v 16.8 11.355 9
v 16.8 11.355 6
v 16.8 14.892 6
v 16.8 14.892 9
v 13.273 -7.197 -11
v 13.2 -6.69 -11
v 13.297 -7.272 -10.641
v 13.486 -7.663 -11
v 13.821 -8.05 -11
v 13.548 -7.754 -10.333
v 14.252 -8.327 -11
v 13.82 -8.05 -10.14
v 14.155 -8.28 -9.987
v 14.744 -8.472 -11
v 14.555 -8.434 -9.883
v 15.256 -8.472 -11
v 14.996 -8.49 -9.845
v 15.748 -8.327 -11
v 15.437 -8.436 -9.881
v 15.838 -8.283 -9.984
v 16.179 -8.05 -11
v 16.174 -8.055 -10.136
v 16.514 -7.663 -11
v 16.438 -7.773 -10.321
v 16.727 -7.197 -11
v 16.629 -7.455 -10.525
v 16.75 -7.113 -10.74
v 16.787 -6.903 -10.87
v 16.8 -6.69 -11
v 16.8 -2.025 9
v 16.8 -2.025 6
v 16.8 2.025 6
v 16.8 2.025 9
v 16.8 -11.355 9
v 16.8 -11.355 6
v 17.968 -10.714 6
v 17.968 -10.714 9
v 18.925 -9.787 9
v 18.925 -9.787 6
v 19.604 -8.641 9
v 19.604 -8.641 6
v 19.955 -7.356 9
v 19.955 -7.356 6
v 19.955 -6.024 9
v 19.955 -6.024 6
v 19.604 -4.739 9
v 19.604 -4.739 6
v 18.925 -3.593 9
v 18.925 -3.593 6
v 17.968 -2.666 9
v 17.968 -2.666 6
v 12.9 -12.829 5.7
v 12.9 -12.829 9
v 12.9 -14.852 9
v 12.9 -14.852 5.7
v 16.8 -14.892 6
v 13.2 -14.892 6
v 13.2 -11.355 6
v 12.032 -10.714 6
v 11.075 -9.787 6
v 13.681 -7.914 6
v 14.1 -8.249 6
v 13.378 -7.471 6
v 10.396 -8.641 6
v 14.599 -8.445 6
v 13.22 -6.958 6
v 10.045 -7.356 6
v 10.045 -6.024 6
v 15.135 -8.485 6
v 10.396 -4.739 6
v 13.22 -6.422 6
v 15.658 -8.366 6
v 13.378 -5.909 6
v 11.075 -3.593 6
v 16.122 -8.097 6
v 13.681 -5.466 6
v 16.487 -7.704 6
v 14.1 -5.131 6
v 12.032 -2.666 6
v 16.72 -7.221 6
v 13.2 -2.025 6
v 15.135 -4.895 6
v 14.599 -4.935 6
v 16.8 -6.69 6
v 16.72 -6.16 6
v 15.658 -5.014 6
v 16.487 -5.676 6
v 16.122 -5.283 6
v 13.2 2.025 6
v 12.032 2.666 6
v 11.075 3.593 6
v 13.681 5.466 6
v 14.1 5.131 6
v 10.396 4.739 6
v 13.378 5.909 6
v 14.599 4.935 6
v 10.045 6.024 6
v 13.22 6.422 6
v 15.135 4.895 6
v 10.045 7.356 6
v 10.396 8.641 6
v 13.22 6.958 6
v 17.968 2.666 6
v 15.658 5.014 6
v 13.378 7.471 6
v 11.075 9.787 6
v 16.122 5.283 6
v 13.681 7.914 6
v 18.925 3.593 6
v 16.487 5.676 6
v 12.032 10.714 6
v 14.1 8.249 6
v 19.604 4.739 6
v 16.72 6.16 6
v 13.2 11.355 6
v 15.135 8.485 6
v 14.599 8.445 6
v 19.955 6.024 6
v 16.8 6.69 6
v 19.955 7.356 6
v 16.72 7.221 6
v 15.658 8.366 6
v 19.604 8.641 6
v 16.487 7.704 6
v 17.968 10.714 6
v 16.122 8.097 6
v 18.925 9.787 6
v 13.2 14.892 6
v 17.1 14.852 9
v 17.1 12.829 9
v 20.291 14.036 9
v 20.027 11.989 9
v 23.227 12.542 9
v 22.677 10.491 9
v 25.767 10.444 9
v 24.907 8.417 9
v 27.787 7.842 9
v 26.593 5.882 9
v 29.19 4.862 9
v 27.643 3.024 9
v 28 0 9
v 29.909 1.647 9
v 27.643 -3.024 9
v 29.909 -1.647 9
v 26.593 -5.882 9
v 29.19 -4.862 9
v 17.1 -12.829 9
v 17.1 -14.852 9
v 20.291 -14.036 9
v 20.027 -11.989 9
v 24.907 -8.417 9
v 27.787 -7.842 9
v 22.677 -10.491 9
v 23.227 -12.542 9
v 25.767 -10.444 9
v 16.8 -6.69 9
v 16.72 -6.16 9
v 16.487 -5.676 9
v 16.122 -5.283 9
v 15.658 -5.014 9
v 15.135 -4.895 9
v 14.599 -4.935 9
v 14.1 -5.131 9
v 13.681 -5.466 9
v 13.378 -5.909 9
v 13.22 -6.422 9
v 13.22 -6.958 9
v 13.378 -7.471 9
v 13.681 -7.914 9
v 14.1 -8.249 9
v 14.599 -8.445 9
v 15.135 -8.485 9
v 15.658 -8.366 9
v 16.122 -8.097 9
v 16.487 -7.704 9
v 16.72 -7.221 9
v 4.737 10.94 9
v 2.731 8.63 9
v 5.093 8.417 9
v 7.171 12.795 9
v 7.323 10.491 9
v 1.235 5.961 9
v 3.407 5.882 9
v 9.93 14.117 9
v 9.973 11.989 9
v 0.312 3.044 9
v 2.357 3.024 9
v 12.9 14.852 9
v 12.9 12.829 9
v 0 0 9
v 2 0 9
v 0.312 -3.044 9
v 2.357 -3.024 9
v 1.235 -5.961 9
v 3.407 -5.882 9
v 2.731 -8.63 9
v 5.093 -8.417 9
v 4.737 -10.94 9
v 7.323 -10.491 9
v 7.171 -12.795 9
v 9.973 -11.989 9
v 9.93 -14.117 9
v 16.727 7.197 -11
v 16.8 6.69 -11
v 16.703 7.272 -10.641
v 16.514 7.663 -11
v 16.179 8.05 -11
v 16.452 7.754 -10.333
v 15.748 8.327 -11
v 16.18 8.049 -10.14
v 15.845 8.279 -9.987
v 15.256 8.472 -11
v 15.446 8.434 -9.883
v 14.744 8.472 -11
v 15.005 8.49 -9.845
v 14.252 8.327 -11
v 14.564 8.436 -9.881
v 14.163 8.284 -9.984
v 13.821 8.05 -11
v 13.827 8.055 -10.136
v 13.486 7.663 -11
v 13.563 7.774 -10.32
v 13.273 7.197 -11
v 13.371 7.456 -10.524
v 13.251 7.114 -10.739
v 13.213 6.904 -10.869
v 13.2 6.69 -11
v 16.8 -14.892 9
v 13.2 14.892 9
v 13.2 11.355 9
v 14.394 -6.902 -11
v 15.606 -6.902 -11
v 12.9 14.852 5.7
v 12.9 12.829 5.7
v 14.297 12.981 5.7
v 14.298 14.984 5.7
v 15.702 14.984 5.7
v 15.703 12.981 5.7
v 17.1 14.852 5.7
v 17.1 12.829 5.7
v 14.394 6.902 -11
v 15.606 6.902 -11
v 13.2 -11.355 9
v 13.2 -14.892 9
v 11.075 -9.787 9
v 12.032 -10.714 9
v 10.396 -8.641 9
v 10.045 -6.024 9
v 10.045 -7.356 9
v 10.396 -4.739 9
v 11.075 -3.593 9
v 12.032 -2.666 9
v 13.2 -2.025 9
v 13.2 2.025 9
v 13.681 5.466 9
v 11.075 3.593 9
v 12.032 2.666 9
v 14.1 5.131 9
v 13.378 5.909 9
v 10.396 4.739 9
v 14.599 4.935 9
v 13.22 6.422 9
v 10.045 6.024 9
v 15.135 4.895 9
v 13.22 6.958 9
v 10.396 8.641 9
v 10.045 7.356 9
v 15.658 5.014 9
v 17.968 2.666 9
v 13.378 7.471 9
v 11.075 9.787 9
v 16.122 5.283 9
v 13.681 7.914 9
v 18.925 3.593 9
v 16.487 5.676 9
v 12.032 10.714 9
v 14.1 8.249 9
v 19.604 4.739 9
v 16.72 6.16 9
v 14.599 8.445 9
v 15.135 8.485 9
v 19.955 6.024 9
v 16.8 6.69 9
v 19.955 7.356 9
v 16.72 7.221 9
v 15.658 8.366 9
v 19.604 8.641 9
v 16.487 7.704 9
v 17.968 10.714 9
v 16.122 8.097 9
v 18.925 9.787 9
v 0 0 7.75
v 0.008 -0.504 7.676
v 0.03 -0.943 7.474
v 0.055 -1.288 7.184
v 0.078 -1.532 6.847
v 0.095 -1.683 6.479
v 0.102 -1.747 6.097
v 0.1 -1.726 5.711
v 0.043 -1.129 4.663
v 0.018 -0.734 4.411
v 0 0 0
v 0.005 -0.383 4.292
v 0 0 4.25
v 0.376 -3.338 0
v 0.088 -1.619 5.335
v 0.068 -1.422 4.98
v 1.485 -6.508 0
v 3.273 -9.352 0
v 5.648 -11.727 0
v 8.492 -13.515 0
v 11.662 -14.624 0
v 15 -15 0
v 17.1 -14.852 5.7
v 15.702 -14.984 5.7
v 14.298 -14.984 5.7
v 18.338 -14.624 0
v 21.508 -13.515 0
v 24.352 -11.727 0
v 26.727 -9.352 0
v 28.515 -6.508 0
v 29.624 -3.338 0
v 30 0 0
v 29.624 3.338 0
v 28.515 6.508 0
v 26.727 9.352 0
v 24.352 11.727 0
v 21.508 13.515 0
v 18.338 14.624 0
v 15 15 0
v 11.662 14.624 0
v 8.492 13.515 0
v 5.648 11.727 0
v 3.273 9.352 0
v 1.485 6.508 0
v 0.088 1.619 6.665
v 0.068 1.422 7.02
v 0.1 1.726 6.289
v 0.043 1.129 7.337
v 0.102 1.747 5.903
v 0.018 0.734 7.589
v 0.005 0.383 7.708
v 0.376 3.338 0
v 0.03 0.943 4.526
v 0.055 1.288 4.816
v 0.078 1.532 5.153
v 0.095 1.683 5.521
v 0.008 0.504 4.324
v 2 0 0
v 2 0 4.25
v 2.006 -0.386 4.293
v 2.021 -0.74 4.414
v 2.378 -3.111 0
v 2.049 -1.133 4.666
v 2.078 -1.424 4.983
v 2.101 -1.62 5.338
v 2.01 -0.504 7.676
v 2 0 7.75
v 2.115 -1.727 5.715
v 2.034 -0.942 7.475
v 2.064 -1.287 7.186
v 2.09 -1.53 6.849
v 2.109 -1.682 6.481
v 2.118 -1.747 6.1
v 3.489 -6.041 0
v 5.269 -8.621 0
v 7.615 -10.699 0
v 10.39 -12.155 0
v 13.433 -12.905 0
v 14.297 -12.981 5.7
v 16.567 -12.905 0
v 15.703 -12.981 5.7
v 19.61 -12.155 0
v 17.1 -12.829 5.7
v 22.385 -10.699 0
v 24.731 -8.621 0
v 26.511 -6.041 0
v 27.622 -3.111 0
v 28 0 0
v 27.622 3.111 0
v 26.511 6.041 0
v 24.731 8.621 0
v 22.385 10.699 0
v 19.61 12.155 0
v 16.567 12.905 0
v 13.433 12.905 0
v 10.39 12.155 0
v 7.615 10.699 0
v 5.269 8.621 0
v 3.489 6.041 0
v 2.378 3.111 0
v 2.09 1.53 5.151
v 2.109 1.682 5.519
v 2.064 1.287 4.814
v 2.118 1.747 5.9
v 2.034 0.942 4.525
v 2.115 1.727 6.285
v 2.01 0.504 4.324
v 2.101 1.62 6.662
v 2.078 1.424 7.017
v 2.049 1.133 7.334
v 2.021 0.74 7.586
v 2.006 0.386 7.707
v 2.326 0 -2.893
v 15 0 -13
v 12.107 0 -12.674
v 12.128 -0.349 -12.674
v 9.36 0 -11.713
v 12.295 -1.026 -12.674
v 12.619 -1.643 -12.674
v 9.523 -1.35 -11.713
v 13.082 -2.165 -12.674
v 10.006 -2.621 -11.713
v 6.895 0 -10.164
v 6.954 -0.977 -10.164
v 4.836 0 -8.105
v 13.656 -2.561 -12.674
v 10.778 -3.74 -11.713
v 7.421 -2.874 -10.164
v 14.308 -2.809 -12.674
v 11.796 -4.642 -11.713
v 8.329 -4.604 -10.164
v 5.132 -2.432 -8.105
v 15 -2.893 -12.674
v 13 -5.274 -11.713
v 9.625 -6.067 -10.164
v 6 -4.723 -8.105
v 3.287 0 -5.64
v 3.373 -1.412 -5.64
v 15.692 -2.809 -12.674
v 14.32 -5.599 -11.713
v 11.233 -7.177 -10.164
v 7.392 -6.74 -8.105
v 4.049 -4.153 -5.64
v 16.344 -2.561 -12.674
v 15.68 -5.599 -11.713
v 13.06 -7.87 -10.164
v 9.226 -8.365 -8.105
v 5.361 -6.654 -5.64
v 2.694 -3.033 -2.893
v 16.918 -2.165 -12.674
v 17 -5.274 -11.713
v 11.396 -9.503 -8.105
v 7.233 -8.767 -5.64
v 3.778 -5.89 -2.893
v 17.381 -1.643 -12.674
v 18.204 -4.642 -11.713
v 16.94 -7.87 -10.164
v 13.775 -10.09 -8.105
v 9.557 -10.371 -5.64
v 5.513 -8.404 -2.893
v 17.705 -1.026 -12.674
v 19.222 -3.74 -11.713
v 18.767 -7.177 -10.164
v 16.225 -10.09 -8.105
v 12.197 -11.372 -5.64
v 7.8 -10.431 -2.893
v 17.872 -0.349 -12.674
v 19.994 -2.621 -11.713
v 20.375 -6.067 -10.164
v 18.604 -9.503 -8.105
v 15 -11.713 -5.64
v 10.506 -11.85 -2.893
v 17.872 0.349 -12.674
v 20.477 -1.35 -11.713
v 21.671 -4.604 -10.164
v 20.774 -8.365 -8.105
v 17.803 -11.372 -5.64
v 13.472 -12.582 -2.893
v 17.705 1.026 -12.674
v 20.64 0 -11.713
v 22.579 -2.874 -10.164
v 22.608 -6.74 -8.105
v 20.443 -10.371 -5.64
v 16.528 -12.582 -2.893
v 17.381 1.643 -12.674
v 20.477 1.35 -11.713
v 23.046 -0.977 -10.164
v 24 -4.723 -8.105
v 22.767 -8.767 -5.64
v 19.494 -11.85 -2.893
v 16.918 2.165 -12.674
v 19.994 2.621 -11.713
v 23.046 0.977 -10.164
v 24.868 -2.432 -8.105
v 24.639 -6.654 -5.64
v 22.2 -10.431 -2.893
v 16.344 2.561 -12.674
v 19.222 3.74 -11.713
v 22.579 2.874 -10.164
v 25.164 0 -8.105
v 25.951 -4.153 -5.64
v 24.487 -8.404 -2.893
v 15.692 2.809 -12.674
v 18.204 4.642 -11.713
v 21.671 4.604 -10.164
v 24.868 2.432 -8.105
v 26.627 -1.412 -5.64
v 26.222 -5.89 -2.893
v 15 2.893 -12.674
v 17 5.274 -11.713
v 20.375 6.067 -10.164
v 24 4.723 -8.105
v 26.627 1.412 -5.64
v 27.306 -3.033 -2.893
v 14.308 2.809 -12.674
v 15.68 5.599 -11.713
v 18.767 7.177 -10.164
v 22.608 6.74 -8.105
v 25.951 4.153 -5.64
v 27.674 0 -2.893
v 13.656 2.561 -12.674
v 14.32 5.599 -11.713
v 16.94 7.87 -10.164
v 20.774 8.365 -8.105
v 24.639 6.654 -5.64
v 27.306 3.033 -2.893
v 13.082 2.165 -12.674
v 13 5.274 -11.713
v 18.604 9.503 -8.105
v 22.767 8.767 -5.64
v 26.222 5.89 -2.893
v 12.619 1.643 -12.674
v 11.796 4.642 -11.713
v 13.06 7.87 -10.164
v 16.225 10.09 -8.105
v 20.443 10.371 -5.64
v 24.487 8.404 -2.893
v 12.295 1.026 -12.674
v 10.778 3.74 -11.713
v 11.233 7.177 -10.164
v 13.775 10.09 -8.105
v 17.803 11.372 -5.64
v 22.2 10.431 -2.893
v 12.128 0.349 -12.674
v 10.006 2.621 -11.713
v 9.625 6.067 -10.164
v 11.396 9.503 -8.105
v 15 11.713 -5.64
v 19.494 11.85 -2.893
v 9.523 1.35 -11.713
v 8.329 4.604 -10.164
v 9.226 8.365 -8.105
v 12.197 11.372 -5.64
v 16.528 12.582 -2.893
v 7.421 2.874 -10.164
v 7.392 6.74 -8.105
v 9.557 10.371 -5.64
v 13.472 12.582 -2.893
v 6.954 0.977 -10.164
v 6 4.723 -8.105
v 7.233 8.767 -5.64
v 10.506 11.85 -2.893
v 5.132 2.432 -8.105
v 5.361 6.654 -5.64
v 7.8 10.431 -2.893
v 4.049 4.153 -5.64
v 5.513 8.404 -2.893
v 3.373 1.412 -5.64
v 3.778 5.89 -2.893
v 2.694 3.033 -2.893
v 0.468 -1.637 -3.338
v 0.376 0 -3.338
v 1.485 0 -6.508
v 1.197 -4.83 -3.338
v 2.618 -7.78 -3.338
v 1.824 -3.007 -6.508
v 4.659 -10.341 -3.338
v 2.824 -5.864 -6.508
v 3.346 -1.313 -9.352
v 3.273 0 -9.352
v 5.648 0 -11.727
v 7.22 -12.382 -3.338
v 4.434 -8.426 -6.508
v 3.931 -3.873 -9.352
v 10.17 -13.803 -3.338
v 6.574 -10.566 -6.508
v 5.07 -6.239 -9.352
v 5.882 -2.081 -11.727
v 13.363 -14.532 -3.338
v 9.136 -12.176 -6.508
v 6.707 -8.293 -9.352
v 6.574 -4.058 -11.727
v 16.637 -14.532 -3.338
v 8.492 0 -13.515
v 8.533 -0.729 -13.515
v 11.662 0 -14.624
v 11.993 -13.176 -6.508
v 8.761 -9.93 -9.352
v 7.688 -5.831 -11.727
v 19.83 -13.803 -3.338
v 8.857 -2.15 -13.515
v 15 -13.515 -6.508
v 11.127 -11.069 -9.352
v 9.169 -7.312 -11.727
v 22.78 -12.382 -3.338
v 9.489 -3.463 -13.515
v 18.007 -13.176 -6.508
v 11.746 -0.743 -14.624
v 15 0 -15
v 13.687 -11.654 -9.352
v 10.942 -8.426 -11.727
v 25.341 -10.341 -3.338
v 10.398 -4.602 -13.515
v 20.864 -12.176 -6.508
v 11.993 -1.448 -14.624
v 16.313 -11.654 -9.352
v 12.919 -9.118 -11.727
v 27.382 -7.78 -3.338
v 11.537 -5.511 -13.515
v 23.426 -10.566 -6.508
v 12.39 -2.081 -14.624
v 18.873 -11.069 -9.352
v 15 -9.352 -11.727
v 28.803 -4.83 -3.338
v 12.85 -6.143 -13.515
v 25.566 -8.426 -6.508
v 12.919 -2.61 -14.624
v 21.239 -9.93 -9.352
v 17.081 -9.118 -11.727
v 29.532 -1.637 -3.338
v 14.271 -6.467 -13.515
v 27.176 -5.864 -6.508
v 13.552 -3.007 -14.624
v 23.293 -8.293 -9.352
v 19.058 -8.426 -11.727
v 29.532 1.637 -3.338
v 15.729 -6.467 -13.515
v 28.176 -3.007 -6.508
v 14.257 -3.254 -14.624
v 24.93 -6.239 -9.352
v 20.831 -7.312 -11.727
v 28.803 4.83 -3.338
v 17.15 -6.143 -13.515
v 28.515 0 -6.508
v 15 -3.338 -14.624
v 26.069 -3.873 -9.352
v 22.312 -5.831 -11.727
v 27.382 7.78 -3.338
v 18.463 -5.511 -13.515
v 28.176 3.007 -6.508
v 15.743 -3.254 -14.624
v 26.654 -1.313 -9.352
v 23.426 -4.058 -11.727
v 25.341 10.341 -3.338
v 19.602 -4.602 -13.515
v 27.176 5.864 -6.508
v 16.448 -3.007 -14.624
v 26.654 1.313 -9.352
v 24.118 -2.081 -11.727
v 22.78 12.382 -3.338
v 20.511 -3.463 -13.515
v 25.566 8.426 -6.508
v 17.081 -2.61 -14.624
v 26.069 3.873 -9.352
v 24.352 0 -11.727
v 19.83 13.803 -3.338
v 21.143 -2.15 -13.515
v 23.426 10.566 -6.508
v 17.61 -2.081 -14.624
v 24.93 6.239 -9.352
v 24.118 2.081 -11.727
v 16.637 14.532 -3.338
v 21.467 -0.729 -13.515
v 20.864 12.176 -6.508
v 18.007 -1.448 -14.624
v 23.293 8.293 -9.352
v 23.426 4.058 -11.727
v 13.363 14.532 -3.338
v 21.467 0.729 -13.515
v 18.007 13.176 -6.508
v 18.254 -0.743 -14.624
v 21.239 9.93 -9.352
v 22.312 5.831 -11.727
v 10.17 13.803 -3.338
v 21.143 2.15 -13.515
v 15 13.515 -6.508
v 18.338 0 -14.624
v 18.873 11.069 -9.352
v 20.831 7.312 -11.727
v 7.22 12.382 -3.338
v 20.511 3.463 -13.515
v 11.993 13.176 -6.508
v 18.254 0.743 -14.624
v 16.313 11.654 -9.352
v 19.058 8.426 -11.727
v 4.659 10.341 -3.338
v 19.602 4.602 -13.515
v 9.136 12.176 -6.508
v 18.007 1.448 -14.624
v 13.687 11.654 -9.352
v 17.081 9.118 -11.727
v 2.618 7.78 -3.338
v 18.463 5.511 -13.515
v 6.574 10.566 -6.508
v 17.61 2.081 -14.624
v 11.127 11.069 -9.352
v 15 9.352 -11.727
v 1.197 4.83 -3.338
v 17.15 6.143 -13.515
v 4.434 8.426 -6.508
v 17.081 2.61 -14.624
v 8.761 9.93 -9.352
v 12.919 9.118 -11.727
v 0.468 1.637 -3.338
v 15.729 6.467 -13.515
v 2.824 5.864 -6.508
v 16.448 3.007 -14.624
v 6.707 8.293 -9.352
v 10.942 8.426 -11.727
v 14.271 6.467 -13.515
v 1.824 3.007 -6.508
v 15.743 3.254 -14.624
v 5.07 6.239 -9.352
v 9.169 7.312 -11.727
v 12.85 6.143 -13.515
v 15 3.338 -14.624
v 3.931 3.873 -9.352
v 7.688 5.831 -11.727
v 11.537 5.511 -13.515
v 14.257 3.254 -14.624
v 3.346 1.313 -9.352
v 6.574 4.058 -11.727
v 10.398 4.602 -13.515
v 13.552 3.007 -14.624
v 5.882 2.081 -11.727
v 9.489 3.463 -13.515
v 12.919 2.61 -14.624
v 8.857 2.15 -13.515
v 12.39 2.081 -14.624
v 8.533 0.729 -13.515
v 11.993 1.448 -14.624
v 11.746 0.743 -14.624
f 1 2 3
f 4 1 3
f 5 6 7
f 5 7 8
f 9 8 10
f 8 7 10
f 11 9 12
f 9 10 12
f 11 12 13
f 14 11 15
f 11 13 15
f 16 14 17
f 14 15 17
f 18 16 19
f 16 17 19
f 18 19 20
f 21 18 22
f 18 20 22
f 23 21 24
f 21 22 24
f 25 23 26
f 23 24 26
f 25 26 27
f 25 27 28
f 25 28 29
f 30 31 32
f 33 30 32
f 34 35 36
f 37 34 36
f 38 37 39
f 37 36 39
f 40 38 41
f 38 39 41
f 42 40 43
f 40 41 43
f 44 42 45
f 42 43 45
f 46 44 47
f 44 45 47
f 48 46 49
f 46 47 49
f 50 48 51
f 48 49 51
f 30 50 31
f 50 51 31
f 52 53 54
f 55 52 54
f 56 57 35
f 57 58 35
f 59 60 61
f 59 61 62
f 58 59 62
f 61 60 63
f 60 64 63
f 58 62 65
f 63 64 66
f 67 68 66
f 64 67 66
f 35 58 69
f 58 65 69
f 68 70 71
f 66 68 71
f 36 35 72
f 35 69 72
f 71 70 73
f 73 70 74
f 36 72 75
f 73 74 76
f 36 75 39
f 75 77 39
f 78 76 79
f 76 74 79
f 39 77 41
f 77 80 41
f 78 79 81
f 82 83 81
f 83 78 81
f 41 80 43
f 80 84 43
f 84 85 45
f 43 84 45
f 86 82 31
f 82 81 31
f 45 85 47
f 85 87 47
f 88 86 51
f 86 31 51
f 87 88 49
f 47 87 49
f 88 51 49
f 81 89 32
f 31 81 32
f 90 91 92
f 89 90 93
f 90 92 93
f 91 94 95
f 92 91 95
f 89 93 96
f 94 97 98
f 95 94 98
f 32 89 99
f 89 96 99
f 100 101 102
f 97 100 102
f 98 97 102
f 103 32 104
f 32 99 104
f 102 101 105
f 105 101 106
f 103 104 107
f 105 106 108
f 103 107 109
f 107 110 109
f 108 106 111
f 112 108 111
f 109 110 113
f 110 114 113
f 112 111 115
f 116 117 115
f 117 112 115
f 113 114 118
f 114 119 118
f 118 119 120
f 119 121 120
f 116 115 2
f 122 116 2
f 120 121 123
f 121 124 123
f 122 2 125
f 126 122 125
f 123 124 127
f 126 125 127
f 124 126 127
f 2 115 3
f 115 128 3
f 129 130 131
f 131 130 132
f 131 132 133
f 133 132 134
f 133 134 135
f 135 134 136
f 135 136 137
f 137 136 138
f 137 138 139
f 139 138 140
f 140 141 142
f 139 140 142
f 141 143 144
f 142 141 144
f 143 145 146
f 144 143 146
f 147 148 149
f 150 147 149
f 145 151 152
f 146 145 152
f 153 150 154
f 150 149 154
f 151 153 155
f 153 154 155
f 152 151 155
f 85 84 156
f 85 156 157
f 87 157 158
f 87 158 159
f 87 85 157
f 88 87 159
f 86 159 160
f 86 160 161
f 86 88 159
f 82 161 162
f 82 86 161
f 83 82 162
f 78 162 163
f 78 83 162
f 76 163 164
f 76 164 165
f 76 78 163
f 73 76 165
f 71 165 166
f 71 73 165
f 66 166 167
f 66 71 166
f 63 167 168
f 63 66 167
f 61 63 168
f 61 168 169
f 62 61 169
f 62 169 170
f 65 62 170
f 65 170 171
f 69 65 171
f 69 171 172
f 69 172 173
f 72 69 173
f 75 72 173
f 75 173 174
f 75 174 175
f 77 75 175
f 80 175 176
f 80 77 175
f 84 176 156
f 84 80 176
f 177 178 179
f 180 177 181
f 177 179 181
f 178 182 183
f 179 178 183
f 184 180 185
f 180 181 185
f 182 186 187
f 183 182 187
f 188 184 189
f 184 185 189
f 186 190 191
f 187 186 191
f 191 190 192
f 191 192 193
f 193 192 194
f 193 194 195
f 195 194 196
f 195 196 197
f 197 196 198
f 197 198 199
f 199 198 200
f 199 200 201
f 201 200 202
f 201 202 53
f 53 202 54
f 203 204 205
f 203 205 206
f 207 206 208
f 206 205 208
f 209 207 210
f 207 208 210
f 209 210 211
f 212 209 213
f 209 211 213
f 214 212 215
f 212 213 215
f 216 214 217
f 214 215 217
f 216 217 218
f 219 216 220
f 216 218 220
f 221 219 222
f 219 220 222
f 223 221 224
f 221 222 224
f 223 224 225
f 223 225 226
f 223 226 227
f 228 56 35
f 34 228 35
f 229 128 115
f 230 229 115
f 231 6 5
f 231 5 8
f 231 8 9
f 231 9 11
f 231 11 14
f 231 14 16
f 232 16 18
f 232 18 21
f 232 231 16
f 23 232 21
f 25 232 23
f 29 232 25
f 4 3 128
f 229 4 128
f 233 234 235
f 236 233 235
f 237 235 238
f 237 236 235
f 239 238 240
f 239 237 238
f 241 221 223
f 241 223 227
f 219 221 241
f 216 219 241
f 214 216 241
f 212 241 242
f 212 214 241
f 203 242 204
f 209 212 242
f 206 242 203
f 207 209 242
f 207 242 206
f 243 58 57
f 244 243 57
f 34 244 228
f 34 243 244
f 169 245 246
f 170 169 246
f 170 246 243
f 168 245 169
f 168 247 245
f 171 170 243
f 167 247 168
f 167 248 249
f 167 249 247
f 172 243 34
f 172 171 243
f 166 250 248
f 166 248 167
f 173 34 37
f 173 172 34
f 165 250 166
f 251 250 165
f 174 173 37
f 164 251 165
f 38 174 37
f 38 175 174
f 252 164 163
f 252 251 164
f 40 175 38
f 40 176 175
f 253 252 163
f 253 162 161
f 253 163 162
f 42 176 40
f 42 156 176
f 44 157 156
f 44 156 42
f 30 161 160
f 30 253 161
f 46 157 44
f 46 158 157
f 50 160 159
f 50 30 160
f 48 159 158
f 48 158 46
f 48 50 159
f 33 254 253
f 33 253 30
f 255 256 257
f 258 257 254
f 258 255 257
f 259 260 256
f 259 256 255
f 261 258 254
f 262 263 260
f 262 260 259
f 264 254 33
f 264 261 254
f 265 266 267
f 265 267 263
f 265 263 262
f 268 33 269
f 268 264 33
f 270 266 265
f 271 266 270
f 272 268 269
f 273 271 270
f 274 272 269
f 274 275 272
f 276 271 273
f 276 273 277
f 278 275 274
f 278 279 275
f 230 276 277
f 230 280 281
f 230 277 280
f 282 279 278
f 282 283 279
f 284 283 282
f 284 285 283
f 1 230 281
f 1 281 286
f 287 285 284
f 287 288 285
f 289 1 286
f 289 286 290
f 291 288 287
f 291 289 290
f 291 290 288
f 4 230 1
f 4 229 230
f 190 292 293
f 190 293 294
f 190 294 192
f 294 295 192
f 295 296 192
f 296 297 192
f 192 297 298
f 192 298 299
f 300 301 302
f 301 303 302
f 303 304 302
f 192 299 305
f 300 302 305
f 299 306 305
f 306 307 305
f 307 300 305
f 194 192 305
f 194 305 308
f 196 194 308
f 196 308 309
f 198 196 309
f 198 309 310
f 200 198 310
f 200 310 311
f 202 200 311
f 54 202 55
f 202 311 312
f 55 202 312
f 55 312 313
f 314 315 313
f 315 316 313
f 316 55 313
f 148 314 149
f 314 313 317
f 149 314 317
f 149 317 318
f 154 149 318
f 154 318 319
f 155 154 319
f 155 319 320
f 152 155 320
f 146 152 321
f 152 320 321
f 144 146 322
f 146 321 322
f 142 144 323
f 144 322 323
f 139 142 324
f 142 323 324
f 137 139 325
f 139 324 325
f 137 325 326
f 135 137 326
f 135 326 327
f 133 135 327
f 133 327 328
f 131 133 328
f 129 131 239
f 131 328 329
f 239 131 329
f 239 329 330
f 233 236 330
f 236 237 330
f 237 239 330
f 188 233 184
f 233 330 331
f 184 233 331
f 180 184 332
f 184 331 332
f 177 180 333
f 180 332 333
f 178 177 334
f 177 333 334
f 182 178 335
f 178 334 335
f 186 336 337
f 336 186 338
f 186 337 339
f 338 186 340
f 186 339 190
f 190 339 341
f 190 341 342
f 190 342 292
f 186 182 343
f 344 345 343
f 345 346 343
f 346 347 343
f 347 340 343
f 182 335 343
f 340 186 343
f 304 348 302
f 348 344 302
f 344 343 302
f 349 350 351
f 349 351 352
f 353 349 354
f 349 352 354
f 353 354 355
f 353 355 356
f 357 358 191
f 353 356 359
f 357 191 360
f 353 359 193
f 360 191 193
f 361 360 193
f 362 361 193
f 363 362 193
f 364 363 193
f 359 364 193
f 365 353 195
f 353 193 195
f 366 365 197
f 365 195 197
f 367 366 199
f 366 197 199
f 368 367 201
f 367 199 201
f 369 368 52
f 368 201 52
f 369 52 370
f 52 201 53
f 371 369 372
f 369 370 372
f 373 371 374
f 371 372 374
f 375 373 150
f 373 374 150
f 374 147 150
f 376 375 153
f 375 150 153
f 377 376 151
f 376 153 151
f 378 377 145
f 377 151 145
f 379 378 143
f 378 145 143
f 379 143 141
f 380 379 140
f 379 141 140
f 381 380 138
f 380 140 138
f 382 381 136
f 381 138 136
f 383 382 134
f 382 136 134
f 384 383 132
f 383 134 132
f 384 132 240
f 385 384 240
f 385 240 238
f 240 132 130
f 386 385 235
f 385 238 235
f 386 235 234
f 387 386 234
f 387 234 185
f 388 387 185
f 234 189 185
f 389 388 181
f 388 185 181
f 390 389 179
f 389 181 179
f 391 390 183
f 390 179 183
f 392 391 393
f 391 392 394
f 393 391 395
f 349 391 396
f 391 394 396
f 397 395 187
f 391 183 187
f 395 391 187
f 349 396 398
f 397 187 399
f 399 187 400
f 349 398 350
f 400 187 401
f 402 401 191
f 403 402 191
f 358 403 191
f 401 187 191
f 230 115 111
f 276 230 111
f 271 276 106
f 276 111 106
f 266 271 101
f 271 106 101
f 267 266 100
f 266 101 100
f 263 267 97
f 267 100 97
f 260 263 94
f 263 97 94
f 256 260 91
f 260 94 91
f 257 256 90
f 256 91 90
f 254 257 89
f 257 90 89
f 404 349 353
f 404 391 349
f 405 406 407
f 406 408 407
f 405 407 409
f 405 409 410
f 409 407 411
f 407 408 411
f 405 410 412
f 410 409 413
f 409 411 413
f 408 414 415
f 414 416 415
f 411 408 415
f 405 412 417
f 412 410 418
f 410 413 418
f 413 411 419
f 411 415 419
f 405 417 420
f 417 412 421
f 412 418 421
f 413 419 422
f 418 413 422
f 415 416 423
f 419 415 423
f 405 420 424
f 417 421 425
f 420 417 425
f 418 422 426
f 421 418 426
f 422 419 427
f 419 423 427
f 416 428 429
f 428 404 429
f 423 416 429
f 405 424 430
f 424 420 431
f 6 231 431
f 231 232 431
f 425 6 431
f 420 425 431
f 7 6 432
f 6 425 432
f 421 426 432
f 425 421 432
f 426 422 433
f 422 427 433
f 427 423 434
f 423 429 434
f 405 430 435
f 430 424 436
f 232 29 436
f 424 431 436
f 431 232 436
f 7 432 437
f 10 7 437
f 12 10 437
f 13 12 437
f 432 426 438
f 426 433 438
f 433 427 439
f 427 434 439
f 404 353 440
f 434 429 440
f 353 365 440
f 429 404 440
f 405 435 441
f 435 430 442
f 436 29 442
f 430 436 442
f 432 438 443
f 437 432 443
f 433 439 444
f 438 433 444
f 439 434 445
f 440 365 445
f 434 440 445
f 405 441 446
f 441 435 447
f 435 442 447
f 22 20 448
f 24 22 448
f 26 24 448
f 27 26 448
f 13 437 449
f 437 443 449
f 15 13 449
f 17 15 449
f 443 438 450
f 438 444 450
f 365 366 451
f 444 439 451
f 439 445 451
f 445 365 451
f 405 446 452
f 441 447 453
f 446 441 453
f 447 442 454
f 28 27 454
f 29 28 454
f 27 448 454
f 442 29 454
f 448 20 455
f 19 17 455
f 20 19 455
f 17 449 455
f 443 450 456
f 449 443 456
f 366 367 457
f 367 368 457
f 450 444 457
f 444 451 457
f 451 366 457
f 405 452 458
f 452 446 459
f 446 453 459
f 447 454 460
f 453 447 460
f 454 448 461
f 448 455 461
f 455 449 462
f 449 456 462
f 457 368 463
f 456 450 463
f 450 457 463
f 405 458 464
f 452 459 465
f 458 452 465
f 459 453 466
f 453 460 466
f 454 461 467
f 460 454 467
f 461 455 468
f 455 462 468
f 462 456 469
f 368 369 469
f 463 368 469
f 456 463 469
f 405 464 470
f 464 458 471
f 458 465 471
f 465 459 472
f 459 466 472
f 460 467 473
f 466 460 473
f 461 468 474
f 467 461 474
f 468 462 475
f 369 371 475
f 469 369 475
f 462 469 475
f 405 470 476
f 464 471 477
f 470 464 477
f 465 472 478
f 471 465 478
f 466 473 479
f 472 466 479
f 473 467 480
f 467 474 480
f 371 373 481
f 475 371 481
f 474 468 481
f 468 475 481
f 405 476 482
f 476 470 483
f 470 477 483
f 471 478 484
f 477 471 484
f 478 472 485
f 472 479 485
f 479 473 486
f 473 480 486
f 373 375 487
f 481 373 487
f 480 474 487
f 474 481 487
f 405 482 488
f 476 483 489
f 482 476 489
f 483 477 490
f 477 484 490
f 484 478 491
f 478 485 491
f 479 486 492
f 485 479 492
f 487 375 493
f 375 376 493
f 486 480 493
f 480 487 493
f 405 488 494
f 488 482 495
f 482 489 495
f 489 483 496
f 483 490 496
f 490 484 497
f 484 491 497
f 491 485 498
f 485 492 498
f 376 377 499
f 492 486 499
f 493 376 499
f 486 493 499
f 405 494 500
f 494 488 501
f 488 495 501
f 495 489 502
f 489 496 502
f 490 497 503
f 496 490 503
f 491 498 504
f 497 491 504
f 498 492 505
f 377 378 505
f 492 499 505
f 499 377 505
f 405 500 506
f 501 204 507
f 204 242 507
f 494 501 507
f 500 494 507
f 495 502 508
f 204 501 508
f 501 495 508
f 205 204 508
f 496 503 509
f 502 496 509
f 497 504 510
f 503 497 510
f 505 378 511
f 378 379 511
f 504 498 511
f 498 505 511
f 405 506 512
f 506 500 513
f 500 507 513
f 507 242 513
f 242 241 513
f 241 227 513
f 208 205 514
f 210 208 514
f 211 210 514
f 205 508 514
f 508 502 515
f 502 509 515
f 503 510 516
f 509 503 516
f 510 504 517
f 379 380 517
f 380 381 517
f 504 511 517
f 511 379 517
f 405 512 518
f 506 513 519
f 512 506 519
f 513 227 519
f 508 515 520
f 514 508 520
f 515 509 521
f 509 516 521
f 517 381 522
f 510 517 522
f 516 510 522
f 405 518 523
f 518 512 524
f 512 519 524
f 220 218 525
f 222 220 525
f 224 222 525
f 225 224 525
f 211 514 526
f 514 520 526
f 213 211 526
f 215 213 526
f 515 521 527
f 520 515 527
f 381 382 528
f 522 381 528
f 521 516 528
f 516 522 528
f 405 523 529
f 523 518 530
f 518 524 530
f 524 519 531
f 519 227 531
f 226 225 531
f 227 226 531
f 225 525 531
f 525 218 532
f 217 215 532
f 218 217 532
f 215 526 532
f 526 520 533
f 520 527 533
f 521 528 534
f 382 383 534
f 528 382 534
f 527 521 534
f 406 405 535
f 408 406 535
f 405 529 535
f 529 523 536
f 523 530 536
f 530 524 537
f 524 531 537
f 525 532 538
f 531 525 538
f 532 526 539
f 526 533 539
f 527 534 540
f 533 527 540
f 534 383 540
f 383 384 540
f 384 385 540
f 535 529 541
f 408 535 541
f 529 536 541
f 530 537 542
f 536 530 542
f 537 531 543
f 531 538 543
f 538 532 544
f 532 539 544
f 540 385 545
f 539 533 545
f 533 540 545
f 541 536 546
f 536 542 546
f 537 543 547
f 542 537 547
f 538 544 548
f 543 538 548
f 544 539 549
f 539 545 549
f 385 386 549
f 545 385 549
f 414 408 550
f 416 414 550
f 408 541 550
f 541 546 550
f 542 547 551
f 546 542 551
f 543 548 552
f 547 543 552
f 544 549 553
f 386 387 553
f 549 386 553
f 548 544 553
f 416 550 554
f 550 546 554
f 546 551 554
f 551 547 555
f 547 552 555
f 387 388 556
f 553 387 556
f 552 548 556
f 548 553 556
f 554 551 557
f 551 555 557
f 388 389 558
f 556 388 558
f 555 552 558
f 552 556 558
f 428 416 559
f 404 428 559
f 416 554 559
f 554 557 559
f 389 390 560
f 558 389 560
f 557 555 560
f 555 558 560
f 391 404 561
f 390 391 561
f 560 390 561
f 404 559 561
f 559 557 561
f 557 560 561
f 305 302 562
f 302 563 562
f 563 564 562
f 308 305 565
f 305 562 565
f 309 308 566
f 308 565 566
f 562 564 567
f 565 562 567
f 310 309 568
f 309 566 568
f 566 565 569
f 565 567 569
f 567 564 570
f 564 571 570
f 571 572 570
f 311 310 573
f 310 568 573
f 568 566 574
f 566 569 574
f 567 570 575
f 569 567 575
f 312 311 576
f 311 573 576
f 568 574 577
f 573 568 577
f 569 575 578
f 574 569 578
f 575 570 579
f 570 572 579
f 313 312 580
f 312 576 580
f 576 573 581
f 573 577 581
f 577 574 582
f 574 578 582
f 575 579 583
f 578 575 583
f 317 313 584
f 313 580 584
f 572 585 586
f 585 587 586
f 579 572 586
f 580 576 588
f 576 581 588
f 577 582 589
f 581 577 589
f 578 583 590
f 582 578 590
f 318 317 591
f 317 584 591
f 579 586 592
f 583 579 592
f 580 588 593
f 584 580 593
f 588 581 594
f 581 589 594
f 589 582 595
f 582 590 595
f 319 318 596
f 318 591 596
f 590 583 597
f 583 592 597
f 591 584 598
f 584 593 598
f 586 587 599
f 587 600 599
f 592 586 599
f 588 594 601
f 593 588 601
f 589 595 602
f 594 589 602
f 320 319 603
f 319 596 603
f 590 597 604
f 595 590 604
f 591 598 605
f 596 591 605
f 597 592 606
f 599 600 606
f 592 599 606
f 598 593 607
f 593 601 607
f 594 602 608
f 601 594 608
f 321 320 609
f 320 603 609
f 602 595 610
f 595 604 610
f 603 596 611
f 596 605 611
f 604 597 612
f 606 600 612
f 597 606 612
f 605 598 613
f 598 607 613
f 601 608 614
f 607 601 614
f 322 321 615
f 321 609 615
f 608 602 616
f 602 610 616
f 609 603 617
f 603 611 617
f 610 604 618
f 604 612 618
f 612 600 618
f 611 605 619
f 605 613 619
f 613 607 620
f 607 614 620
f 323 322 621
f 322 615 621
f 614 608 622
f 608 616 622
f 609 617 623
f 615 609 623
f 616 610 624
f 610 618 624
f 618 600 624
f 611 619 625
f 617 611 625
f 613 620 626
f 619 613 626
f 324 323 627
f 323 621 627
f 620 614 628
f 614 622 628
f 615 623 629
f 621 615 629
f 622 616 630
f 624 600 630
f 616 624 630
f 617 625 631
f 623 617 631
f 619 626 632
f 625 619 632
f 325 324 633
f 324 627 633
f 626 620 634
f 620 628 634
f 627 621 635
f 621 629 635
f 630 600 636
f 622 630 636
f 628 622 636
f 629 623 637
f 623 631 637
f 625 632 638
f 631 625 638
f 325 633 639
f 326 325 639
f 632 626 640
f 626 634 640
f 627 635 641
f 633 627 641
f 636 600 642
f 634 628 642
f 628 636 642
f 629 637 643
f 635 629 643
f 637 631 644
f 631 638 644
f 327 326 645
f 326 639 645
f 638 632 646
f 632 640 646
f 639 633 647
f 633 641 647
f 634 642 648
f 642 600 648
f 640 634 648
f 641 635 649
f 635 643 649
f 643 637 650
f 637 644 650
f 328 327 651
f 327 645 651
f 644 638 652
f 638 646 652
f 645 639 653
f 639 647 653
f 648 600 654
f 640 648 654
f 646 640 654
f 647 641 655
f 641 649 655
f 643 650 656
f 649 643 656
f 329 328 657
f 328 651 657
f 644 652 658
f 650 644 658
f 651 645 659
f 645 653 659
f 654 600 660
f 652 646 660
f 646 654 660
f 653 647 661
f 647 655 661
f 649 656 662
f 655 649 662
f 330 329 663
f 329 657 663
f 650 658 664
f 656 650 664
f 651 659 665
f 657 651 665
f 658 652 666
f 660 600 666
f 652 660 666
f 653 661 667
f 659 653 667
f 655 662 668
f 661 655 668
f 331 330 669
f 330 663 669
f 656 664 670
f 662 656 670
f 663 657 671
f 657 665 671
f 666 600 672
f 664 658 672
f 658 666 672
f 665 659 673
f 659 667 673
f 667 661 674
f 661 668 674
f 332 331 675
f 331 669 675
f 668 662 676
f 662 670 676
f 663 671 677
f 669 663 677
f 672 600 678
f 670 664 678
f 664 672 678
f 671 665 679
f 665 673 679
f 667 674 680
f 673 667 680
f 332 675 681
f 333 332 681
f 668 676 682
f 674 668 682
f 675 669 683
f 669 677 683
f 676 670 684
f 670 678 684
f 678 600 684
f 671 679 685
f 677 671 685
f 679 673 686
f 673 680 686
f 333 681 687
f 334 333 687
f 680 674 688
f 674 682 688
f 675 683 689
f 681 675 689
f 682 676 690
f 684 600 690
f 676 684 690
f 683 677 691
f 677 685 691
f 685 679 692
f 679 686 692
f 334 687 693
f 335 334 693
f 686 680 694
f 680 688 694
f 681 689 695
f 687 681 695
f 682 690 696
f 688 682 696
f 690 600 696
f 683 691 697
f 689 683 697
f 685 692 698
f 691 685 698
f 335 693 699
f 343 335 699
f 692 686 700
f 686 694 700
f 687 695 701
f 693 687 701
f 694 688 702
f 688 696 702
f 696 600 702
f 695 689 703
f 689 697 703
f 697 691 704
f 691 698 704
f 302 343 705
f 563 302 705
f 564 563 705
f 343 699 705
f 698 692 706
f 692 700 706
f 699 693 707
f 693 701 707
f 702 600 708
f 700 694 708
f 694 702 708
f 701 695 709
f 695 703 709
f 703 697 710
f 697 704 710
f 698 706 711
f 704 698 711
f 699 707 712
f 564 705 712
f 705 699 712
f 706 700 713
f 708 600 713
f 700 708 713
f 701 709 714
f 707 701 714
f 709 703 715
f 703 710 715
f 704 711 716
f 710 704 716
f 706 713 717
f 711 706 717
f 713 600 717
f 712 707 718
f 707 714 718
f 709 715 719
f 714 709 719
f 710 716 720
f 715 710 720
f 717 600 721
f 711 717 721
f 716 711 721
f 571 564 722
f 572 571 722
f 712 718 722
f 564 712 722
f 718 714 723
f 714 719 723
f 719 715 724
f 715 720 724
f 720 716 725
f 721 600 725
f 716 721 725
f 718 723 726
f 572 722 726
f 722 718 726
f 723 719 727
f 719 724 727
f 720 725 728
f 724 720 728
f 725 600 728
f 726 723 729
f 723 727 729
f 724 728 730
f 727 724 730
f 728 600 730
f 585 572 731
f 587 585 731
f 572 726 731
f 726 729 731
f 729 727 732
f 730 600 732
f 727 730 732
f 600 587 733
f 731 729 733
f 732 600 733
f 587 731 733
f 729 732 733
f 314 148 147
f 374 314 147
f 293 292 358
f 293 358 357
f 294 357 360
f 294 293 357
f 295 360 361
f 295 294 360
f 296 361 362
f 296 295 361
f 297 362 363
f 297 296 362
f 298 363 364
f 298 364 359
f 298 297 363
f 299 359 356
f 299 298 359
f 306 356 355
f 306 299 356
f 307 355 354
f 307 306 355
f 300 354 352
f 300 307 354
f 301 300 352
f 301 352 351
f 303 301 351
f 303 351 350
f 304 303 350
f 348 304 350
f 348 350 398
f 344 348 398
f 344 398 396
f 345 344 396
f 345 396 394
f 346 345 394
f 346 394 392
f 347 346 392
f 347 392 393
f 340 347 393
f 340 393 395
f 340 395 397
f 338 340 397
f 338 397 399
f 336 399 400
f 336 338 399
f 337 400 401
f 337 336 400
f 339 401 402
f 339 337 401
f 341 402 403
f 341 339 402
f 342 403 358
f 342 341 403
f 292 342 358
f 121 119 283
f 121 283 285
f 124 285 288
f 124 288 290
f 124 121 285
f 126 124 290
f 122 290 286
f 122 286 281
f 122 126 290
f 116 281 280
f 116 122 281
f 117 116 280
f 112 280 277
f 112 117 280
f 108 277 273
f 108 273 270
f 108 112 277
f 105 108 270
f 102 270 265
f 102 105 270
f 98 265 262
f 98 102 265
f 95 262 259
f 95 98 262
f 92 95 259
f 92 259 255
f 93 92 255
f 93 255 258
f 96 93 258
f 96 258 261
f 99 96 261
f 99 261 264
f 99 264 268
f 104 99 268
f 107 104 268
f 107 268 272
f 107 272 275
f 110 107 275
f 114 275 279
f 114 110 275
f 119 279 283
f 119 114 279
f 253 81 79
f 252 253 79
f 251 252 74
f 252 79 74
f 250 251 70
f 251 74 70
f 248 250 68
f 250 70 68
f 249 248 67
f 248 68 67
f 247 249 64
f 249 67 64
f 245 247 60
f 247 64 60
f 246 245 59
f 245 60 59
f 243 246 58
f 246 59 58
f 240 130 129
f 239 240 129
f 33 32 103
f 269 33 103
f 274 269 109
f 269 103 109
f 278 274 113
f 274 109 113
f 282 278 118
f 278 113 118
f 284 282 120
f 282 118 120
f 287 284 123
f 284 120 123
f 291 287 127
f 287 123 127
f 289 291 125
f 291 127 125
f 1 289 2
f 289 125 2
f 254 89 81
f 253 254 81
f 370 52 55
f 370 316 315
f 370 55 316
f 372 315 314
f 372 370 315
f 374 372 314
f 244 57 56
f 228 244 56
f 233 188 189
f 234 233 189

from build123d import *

# Parameters (mm, degrees)
SKETCH4_R           = 1.75
CUT_EXTRUDE1_DEPTH  = 10
SKETCH5_R           = 1.8
BOSS_EXTRUDE1_DEPTH = 3
SKETCH5_3_R         = 1.8
CUT_EXTRUDE3_DEPTH  = 20
CUT_EXTRUDE4_DEPTH  = 3.3


with BuildPart() as part:
    # Sketch2 → Revolve3 (revolve)
    with BuildSketch(Plane(origin=(0, 0, 0), x_dir=(1, 0, 0), z_dir=(0, 1, 0))):
        with BuildLine():
            ThreePointArc((15, 15), (4.393398282, 10.606601718), (0, 0))
            Line((0, 0), (0, -9))
            Line((0, -9), (2, -9))
            Line((2, -9), (2, 0))
            ThreePointArc((2, 0), (5.807611845, 9.192388155), (15, 13))
            Line((15, 13), (15, 15))
        make_face()
    revolve(axis=Axis((15, 0, -26.392000581), (0, 0, 1)))

    # Sketch4 → Cut-Extrude1 (cut)
    with BuildSketch(Plane(origin=(0, 0, 0), x_dir=(0, 0, -1), z_dir=(1, 0, 0))):
        with Locations((-6, 0)):
            Circle(SKETCH4_R)
    extrude(amount=CUT_EXTRUDE1_DEPTH, mode=Mode.SUBTRACT)

    # Sketch5<3> → Cut-Extrude3 (cut)
    with BuildSketch(Plane.XY.offset(9)):
        with Locations((15, -6.690068277)):
            Circle(SKETCH5_3_R)
        with Locations((15, 6.690068277)):
            Circle(SKETCH5_3_R)
    extrude(amount=-CUT_EXTRUDE3_DEPTH, mode=Mode.SUBTRACT)

    # Sketch5<5> → Cut-Extrude4 (cut)
    with BuildSketch(Plane.XY.offset(9)):
        with BuildLine():
            ThreePointArc((17.1, -11.227688799), (15, -11.690068277), (12.9, -11.227688799))
            Line((12.9, -11.227688799), (12.9, -15))
            Line((12.9, -15), (17.1, -15))
            Line((17.1, -15), (17.1, -11.227688799))
        make_face()
        with BuildLine():
            Line((17.1, 11.227688799), (17.1, 15))
            Line((17.1, 15), (12.9, 15))
            Line((12.9, 15), (12.9, 11.227688799))
            ThreePointArc((12.9, 11.227688799), (15, 11.690068277), (17.1, 11.227688799))
        make_face()
    extrude(amount=-CUT_EXTRUDE4_DEPTH, mode=Mode.SUBTRACT)


with BuildPart() as body_2:
    # Sketch5 → Boss-Extrude1 (new body)
    with BuildSketch(Plane.XY.offset(9)):
        with BuildLine():
            Line((13.2, -11.354829793), (13.2, -14.891608375))
            Line((13.2, -14.891608375), (16.8, -14.891608375))
            Line((16.8, -14.891608375), (16.8, -11.354829793))
            ThreePointArc((16.8, -11.354829793), (20, -6.690068277), (16.8, -2.025306761))
            Line((16.8, -2.025306761), (16.8, 2.025306761))
            ThreePointArc((16.8, 2.025306761), (20, 6.690068277), (16.8, 11.354829793))
            Line((16.8, 11.354829793), (16.8, 14.891608375))
            Line((16.8, 14.891608375), (13.2, 14.891608375))
            Line((13.2, 14.891608375), (13.2, 11.354829793))
            ThreePointArc((13.2, 11.354829793), (10, 6.690068277), (13.2, 2.025306761))
            Line((13.2, 2.025306761), (13.2, -2.025306761))
            ThreePointArc((13.2, -2.025306761), (10, -6.690068277), (13.2, -11.354829793))
        make_face()
        with Locations((15, -6.690068277)):
            Circle(SKETCH5_R, mode=Mode.SUBTRACT)
        with Locations((15, 6.690068277)):
            Circle(SKETCH5_R, mode=Mode.SUBTRACT)
    extrude(amount=-BOSS_EXTRUDE1_DEPTH)


solid = Compound([part.part, body_2.part])
